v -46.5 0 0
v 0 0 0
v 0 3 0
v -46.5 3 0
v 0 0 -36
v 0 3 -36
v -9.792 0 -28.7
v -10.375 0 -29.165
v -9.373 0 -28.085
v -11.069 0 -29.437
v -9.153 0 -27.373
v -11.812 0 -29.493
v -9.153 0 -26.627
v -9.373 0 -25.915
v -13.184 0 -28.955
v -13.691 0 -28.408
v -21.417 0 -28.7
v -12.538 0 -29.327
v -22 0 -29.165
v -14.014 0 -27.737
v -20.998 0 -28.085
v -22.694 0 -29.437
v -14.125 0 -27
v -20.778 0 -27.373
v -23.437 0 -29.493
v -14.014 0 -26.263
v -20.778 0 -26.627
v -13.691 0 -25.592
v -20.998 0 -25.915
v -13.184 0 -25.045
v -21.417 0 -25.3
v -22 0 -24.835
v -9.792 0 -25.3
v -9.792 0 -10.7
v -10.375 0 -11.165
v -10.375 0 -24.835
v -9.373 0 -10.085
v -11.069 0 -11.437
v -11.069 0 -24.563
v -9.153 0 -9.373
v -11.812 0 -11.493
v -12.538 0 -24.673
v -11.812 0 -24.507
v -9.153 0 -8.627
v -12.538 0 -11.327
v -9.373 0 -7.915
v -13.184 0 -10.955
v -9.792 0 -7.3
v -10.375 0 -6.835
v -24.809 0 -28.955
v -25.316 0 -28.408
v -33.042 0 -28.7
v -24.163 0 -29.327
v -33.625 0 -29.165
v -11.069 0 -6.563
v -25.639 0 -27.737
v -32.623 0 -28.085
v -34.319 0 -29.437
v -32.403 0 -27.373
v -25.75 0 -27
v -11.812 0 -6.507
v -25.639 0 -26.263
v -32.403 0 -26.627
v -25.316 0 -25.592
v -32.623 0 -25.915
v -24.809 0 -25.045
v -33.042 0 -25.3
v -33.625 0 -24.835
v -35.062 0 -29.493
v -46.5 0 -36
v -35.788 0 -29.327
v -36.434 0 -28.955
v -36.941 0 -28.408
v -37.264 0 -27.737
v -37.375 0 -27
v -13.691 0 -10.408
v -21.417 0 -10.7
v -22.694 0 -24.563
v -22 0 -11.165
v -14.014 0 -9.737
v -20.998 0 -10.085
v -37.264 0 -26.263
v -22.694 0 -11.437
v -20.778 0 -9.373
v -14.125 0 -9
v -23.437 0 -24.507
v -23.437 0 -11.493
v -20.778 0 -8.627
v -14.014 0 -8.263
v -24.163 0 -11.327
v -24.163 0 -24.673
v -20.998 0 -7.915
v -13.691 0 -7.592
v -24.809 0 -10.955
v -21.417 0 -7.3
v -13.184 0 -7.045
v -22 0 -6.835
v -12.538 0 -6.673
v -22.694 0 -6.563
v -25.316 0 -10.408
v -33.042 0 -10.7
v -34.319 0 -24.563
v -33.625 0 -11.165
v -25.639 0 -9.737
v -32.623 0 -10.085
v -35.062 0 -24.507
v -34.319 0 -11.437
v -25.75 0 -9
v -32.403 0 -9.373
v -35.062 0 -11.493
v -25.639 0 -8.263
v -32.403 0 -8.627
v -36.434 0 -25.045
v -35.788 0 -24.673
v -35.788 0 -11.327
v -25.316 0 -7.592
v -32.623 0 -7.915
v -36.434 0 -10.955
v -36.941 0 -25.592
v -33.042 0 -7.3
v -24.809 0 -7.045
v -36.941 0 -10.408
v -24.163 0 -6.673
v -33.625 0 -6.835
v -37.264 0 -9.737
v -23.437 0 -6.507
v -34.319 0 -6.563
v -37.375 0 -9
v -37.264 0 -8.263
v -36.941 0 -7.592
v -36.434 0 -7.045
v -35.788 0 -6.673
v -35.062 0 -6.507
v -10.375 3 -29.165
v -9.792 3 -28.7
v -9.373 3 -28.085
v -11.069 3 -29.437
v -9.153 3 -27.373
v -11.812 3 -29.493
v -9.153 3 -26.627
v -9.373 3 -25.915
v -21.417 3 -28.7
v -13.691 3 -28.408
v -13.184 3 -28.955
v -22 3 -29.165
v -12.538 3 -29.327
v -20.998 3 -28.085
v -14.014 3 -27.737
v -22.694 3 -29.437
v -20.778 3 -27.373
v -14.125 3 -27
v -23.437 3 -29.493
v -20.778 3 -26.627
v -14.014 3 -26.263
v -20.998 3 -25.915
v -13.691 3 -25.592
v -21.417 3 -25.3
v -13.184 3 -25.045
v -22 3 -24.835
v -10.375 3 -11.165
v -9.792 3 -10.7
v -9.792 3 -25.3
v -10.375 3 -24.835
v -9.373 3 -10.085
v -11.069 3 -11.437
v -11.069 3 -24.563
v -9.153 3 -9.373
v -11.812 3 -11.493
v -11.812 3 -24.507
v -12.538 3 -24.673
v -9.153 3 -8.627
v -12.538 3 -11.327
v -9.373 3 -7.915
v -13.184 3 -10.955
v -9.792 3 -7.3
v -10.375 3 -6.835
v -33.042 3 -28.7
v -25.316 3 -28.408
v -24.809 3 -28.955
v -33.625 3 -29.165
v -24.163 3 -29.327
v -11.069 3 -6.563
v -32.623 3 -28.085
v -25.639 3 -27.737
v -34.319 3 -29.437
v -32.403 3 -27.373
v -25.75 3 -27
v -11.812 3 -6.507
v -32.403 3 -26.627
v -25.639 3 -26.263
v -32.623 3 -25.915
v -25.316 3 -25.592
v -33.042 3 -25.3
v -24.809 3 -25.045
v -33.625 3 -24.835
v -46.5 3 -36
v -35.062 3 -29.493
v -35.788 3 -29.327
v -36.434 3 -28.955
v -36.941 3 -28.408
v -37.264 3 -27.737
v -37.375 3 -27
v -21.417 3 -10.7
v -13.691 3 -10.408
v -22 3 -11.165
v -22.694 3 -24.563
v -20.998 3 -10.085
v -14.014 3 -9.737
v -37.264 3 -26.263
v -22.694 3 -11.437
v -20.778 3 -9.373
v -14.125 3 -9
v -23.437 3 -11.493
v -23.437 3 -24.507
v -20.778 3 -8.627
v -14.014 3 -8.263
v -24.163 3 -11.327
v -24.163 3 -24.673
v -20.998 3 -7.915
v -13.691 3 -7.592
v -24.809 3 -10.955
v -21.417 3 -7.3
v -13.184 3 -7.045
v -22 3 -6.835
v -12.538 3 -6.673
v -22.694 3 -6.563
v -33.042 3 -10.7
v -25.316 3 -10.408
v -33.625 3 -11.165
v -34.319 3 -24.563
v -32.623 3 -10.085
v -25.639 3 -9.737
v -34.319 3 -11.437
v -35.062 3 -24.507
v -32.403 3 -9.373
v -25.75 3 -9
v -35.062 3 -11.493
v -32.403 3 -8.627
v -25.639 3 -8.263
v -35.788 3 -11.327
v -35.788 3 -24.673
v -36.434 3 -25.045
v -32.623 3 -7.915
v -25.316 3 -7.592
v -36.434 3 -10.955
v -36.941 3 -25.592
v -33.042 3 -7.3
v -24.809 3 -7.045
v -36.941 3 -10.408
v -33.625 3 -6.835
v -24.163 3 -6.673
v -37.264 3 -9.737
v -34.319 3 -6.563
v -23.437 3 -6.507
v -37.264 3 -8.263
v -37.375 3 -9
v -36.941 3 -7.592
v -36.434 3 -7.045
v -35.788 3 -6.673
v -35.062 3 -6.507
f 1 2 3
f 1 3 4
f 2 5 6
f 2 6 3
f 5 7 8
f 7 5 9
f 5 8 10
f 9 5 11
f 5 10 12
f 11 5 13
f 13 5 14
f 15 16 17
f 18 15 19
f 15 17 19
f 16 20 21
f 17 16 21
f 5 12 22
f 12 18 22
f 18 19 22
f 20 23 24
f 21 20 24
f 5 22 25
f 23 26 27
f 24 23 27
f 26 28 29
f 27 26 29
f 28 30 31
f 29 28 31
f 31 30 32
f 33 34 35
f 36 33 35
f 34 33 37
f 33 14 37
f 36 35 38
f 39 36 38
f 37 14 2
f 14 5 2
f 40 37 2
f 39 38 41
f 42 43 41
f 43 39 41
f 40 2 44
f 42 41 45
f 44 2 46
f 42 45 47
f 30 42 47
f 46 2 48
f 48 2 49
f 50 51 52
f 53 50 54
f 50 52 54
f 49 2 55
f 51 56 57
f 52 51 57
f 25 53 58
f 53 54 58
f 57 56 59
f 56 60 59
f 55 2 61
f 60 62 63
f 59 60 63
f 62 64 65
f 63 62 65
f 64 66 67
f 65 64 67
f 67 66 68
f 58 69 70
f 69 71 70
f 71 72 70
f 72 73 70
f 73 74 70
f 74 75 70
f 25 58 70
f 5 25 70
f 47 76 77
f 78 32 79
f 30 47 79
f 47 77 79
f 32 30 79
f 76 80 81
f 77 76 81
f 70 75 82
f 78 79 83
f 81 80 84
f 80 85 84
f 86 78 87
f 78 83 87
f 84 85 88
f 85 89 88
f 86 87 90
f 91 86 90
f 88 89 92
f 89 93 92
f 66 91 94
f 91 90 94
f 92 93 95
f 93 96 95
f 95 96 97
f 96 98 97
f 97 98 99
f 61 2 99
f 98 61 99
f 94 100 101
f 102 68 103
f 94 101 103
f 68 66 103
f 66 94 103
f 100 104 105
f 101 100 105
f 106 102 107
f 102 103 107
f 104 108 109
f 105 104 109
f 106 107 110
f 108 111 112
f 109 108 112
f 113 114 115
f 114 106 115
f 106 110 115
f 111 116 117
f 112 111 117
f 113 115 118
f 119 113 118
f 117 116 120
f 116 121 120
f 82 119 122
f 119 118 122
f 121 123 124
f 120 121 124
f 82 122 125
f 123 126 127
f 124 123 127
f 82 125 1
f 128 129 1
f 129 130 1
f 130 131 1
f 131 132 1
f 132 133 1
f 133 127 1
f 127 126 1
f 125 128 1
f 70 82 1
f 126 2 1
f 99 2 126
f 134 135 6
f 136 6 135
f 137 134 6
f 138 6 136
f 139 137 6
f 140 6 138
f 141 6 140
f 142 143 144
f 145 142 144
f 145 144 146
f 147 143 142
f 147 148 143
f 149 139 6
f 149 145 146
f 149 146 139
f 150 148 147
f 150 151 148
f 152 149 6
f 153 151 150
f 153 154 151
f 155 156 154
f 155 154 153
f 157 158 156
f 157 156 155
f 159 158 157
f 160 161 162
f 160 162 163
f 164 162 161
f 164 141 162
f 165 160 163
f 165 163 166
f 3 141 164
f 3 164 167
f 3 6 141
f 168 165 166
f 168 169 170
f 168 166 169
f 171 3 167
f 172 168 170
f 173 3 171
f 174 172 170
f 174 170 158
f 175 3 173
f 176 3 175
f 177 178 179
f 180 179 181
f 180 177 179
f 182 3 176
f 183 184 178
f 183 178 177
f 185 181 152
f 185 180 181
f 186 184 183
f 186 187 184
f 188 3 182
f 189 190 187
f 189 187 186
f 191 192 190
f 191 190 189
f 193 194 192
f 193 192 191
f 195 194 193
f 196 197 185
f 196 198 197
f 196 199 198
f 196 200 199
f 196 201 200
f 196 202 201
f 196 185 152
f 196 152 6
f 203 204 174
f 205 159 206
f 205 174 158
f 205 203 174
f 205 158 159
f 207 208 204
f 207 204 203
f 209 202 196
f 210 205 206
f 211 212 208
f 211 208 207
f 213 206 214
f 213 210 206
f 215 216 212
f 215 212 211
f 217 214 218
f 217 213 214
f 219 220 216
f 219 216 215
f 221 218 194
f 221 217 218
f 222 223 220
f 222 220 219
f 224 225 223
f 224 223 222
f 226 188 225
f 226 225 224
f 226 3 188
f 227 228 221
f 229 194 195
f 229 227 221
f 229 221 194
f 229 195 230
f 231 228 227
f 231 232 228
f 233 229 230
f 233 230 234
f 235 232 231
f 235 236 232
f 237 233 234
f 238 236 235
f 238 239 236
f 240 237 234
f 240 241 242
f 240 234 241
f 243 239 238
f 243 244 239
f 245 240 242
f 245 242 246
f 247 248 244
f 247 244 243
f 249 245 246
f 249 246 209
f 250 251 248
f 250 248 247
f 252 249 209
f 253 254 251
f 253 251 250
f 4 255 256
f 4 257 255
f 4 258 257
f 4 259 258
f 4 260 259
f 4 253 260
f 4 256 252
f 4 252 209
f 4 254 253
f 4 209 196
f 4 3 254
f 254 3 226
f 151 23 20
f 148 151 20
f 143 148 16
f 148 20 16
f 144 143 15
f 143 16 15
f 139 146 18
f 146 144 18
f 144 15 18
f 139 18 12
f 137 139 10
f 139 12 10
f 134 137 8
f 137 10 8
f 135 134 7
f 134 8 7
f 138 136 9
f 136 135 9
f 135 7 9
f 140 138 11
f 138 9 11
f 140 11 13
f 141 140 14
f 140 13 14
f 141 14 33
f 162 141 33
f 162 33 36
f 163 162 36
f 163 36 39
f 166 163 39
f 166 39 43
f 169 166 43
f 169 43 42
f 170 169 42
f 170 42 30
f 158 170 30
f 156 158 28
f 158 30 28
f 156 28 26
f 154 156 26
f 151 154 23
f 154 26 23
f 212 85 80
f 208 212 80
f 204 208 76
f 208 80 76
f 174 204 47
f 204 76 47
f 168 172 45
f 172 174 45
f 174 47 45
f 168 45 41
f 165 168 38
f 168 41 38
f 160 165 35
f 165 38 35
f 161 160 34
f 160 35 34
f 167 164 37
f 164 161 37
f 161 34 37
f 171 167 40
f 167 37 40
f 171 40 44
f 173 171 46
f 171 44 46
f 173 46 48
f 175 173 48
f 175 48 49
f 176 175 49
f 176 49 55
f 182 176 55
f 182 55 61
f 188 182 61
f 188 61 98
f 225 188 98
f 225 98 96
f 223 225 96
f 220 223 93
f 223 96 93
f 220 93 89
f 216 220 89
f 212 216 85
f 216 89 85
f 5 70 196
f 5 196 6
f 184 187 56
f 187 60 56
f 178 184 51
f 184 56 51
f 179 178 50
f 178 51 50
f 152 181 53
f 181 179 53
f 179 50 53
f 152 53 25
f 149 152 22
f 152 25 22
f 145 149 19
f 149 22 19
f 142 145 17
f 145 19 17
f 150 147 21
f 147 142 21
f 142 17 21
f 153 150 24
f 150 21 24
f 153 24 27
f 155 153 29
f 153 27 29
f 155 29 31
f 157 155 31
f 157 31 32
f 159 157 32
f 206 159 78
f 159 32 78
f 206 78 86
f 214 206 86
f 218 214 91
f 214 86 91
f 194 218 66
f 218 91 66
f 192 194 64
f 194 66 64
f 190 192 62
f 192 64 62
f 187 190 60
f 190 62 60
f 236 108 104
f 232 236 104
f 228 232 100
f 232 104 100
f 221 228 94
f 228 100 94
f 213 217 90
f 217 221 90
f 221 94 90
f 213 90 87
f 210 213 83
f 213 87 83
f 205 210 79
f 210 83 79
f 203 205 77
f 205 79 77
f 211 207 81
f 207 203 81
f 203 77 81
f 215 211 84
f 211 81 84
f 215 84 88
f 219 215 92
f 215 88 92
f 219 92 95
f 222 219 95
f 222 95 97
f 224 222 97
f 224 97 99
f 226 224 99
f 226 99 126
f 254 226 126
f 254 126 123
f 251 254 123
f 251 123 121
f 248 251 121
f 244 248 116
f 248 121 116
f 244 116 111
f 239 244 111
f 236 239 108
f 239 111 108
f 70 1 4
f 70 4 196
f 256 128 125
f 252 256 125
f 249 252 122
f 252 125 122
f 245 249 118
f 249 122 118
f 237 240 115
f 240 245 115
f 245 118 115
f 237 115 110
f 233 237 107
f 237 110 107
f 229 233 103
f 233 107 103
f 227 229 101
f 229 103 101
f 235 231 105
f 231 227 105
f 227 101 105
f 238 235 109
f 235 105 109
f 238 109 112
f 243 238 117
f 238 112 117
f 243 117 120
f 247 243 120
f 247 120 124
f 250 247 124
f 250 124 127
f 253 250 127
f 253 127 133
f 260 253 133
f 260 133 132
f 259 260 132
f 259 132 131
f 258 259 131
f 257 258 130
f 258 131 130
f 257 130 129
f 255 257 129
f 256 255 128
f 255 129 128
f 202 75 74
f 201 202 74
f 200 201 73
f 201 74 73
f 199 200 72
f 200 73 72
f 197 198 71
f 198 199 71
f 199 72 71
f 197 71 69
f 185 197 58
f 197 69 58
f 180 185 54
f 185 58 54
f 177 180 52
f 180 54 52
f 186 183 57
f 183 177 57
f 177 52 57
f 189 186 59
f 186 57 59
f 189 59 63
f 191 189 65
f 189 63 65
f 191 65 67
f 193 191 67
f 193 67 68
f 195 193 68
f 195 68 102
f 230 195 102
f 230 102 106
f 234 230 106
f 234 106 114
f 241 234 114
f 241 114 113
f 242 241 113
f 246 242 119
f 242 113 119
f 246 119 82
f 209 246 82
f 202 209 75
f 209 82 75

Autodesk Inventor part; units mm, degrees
ref_plane "YZ Plane" through (0, 0, 0) normal (1, 0, 0) x (0, 1, 0)
ref_plane "XZ Plane" through (0, 0, 0) normal (0, 1, 0) x (-1, 0, 0)
ref_plane "XY Plane" through (0, 0, 0) normal (0, 0, 1) x (1, 0, 0)
sketch "Sketch1" plane through (0, 0, 0) normal (0, 1, 0) x (-1, 0, 0)
  line L0 (0, 0) -> (46.5, 0)
  line L1 (46.5, 0) -> (46.5, -36)
  line L2 (46.5, -36) -> (0, -36)
  line L3 (0, -36) -> (0, 0)
  circle A0 centre (34.875, -27) radius 2.5
  circle A1 centre (11.625, -27) radius 2.5
  circle A2 centre (23.25, -27) radius 2.5
  line L4 (46.5, -18) -> (0, -18)
  circle A3 centre (34.875, -9) radius 2.5
  circle A4 centre (11.625, -9) radius 2.5
  circle A5 centre (23.25, -9) radius 2.5
  dimension "d0" = 46.5
  dimension "d1" = 36
  dimension "d2" = 5
  dimension "d3" = 11.625
  dimension "d4" = 27
  dimension "d6" = 5
  dimension "d7" = 11.625
  dimension "d13" = 5
  dimension "d15" = 11.625
extrude "Extrusion6" add sketch "Sketch1" along normal blind 3
properties part number "chassiconnector"
